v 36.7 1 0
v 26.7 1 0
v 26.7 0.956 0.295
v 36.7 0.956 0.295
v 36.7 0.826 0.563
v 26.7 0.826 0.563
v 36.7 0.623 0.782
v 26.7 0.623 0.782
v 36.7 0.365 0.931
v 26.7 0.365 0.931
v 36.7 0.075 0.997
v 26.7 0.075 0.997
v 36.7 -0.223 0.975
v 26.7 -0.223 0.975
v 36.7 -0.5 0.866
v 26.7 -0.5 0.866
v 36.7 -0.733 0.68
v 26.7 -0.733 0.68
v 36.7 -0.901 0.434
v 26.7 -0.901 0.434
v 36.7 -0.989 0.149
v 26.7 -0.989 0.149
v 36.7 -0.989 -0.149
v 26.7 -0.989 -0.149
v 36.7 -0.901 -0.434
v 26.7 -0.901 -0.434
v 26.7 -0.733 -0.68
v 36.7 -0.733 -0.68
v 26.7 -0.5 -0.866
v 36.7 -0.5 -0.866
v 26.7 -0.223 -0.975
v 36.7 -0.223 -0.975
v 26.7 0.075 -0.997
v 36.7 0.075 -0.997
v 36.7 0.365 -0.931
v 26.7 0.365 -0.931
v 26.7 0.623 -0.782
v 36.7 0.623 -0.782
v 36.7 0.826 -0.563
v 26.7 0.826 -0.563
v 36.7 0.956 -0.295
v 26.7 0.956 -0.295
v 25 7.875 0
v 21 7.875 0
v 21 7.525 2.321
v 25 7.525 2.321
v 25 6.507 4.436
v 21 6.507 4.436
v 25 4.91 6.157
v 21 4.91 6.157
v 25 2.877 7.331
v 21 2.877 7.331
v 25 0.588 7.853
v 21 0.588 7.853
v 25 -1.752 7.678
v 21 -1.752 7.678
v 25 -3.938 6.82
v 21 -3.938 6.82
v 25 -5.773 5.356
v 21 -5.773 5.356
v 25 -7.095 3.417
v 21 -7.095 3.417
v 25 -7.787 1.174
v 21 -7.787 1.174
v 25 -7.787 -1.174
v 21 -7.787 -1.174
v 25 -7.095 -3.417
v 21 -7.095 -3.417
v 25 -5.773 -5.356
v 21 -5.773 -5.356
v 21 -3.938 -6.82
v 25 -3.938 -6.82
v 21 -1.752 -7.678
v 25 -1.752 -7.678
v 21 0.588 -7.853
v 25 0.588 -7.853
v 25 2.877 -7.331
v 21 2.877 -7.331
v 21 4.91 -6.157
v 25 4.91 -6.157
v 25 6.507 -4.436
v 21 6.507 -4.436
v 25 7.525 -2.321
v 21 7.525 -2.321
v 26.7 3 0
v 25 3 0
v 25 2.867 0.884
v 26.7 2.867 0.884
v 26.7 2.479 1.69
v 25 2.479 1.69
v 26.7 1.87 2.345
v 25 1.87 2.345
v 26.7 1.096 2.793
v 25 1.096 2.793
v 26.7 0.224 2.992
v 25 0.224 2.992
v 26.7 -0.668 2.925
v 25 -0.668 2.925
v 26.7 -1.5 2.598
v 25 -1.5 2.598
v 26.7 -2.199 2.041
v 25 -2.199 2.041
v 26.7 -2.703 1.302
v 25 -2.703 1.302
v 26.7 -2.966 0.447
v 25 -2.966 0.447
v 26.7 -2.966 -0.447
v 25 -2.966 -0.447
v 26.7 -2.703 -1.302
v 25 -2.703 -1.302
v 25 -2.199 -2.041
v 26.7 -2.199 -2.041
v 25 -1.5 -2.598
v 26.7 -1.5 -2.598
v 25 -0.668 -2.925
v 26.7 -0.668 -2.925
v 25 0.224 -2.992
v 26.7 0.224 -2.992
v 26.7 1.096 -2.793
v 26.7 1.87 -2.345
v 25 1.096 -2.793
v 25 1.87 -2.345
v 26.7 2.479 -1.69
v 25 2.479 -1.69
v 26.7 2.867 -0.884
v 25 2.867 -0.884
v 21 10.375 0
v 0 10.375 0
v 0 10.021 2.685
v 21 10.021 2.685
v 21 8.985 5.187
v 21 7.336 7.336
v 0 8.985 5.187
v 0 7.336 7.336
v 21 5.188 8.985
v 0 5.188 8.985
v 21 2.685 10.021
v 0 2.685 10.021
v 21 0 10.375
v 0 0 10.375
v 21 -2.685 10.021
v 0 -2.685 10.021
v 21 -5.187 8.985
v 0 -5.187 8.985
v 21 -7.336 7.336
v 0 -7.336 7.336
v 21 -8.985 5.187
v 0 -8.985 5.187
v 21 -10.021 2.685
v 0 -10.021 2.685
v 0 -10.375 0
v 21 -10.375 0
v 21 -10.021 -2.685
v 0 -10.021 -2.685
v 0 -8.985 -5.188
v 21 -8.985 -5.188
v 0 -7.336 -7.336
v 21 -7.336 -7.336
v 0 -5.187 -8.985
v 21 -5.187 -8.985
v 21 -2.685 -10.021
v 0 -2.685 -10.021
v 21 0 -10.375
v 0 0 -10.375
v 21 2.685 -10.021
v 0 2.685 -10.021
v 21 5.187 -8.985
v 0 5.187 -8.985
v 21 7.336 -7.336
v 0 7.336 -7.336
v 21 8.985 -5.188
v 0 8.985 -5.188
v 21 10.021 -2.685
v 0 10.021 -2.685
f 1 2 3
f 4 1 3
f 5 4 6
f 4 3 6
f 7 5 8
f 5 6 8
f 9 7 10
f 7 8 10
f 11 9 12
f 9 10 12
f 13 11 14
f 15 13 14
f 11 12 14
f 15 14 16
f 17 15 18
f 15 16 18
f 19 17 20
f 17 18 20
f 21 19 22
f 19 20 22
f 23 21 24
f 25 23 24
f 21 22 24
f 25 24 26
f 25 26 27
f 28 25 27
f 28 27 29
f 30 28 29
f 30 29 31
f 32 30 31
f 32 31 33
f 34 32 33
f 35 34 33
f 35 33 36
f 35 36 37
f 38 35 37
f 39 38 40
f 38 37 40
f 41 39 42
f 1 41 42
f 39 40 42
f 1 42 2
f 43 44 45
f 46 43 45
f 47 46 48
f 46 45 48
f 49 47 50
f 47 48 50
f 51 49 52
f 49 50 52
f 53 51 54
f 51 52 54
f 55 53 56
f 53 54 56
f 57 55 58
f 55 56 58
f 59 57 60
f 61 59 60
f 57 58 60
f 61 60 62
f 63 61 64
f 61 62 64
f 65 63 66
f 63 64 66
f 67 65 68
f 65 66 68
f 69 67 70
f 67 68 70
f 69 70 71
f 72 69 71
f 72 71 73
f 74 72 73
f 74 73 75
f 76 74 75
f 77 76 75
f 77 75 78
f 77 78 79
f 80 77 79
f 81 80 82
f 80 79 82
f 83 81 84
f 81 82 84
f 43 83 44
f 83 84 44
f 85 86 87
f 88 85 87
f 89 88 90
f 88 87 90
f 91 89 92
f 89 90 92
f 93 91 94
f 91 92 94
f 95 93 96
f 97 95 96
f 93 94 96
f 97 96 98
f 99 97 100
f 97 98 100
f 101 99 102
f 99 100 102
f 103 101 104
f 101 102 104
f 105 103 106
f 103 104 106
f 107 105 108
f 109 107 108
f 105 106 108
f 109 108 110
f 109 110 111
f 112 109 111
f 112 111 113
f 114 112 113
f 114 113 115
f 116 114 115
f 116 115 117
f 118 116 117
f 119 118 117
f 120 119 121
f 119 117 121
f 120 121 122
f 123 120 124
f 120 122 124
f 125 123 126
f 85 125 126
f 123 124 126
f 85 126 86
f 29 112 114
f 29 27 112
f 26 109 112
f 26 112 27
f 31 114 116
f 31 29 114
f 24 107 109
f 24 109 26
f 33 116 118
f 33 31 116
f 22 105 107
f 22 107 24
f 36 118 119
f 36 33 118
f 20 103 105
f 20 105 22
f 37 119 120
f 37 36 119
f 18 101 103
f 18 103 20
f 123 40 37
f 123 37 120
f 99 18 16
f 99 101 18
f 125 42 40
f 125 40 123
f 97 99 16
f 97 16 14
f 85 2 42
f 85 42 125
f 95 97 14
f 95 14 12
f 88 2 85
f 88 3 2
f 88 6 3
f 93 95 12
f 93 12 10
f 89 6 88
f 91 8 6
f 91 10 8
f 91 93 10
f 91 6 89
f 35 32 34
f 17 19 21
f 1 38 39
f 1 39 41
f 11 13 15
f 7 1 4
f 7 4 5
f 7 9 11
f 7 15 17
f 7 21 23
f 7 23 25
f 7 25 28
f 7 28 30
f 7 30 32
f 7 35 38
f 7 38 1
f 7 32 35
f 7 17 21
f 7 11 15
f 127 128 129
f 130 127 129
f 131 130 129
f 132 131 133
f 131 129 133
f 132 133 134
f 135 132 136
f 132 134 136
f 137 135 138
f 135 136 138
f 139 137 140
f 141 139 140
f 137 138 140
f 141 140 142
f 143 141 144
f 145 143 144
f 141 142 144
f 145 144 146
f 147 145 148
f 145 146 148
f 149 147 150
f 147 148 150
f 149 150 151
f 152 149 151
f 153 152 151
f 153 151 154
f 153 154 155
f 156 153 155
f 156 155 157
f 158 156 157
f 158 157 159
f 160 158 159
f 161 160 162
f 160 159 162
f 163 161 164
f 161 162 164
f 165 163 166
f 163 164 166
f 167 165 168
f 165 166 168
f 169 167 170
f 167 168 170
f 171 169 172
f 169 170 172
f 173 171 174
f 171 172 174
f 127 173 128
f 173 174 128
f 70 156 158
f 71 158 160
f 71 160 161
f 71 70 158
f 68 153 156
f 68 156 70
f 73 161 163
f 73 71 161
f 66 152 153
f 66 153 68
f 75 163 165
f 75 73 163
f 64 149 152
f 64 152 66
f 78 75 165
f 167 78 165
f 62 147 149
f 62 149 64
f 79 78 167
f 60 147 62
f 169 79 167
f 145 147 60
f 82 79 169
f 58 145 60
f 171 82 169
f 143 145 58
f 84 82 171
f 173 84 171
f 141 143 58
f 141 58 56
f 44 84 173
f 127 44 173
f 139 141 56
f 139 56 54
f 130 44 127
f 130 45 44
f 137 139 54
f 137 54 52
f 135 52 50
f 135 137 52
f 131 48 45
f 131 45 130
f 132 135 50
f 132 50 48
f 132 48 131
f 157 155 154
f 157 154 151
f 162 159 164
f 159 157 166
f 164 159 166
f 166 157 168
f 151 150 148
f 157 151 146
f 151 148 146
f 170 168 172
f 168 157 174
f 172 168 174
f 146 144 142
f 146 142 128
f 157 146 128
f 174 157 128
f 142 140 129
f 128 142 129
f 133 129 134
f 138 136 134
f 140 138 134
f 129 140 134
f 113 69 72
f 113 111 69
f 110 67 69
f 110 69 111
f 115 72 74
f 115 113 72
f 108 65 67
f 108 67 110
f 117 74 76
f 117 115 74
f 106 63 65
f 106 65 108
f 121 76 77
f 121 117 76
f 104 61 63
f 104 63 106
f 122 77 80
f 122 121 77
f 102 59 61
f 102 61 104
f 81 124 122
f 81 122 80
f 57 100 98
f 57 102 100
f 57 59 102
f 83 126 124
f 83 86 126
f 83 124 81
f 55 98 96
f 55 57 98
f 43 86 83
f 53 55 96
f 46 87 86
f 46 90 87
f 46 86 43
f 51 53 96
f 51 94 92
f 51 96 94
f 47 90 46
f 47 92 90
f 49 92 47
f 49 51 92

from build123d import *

# Parameters (mm, degrees)
SKETCH_R     = 10.375
PAD_DEPTH    = 21
SKETCH001_R  = 7.875
PAD001_DEPTH = 4
SKETCH002_R  = 3
PAD002_DEPTH = 1.7
SKETCH003_R  = 1
PAD003_DEPTH = 10


with BuildPart() as part:
    # Sketch → Pad (new body)
    with BuildSketch(Plane.YZ):
        Circle(SKETCH_R)
    extrude(amount=PAD_DEPTH)

    # Sketch001 (on Face3 of Pad) → Pad001 (join)
    with BuildSketch(Plane.YZ.offset(21)):
        Circle(SKETCH001_R)
    extrude(amount=PAD001_DEPTH)

    # Sketch002 (on Face5 of Pad001) → Pad002 (join)
    with BuildSketch(Plane.YZ.offset(25)):
        Circle(SKETCH002_R)
    extrude(amount=PAD002_DEPTH)

    # Sketch003 (on Face7 of Pad002) → Pad003 (join)
    with BuildSketch(Plane.YZ.offset(26.7)):
        Circle(SKETCH003_R)
    extrude(amount=PAD003_DEPTH)


solid = part.part
